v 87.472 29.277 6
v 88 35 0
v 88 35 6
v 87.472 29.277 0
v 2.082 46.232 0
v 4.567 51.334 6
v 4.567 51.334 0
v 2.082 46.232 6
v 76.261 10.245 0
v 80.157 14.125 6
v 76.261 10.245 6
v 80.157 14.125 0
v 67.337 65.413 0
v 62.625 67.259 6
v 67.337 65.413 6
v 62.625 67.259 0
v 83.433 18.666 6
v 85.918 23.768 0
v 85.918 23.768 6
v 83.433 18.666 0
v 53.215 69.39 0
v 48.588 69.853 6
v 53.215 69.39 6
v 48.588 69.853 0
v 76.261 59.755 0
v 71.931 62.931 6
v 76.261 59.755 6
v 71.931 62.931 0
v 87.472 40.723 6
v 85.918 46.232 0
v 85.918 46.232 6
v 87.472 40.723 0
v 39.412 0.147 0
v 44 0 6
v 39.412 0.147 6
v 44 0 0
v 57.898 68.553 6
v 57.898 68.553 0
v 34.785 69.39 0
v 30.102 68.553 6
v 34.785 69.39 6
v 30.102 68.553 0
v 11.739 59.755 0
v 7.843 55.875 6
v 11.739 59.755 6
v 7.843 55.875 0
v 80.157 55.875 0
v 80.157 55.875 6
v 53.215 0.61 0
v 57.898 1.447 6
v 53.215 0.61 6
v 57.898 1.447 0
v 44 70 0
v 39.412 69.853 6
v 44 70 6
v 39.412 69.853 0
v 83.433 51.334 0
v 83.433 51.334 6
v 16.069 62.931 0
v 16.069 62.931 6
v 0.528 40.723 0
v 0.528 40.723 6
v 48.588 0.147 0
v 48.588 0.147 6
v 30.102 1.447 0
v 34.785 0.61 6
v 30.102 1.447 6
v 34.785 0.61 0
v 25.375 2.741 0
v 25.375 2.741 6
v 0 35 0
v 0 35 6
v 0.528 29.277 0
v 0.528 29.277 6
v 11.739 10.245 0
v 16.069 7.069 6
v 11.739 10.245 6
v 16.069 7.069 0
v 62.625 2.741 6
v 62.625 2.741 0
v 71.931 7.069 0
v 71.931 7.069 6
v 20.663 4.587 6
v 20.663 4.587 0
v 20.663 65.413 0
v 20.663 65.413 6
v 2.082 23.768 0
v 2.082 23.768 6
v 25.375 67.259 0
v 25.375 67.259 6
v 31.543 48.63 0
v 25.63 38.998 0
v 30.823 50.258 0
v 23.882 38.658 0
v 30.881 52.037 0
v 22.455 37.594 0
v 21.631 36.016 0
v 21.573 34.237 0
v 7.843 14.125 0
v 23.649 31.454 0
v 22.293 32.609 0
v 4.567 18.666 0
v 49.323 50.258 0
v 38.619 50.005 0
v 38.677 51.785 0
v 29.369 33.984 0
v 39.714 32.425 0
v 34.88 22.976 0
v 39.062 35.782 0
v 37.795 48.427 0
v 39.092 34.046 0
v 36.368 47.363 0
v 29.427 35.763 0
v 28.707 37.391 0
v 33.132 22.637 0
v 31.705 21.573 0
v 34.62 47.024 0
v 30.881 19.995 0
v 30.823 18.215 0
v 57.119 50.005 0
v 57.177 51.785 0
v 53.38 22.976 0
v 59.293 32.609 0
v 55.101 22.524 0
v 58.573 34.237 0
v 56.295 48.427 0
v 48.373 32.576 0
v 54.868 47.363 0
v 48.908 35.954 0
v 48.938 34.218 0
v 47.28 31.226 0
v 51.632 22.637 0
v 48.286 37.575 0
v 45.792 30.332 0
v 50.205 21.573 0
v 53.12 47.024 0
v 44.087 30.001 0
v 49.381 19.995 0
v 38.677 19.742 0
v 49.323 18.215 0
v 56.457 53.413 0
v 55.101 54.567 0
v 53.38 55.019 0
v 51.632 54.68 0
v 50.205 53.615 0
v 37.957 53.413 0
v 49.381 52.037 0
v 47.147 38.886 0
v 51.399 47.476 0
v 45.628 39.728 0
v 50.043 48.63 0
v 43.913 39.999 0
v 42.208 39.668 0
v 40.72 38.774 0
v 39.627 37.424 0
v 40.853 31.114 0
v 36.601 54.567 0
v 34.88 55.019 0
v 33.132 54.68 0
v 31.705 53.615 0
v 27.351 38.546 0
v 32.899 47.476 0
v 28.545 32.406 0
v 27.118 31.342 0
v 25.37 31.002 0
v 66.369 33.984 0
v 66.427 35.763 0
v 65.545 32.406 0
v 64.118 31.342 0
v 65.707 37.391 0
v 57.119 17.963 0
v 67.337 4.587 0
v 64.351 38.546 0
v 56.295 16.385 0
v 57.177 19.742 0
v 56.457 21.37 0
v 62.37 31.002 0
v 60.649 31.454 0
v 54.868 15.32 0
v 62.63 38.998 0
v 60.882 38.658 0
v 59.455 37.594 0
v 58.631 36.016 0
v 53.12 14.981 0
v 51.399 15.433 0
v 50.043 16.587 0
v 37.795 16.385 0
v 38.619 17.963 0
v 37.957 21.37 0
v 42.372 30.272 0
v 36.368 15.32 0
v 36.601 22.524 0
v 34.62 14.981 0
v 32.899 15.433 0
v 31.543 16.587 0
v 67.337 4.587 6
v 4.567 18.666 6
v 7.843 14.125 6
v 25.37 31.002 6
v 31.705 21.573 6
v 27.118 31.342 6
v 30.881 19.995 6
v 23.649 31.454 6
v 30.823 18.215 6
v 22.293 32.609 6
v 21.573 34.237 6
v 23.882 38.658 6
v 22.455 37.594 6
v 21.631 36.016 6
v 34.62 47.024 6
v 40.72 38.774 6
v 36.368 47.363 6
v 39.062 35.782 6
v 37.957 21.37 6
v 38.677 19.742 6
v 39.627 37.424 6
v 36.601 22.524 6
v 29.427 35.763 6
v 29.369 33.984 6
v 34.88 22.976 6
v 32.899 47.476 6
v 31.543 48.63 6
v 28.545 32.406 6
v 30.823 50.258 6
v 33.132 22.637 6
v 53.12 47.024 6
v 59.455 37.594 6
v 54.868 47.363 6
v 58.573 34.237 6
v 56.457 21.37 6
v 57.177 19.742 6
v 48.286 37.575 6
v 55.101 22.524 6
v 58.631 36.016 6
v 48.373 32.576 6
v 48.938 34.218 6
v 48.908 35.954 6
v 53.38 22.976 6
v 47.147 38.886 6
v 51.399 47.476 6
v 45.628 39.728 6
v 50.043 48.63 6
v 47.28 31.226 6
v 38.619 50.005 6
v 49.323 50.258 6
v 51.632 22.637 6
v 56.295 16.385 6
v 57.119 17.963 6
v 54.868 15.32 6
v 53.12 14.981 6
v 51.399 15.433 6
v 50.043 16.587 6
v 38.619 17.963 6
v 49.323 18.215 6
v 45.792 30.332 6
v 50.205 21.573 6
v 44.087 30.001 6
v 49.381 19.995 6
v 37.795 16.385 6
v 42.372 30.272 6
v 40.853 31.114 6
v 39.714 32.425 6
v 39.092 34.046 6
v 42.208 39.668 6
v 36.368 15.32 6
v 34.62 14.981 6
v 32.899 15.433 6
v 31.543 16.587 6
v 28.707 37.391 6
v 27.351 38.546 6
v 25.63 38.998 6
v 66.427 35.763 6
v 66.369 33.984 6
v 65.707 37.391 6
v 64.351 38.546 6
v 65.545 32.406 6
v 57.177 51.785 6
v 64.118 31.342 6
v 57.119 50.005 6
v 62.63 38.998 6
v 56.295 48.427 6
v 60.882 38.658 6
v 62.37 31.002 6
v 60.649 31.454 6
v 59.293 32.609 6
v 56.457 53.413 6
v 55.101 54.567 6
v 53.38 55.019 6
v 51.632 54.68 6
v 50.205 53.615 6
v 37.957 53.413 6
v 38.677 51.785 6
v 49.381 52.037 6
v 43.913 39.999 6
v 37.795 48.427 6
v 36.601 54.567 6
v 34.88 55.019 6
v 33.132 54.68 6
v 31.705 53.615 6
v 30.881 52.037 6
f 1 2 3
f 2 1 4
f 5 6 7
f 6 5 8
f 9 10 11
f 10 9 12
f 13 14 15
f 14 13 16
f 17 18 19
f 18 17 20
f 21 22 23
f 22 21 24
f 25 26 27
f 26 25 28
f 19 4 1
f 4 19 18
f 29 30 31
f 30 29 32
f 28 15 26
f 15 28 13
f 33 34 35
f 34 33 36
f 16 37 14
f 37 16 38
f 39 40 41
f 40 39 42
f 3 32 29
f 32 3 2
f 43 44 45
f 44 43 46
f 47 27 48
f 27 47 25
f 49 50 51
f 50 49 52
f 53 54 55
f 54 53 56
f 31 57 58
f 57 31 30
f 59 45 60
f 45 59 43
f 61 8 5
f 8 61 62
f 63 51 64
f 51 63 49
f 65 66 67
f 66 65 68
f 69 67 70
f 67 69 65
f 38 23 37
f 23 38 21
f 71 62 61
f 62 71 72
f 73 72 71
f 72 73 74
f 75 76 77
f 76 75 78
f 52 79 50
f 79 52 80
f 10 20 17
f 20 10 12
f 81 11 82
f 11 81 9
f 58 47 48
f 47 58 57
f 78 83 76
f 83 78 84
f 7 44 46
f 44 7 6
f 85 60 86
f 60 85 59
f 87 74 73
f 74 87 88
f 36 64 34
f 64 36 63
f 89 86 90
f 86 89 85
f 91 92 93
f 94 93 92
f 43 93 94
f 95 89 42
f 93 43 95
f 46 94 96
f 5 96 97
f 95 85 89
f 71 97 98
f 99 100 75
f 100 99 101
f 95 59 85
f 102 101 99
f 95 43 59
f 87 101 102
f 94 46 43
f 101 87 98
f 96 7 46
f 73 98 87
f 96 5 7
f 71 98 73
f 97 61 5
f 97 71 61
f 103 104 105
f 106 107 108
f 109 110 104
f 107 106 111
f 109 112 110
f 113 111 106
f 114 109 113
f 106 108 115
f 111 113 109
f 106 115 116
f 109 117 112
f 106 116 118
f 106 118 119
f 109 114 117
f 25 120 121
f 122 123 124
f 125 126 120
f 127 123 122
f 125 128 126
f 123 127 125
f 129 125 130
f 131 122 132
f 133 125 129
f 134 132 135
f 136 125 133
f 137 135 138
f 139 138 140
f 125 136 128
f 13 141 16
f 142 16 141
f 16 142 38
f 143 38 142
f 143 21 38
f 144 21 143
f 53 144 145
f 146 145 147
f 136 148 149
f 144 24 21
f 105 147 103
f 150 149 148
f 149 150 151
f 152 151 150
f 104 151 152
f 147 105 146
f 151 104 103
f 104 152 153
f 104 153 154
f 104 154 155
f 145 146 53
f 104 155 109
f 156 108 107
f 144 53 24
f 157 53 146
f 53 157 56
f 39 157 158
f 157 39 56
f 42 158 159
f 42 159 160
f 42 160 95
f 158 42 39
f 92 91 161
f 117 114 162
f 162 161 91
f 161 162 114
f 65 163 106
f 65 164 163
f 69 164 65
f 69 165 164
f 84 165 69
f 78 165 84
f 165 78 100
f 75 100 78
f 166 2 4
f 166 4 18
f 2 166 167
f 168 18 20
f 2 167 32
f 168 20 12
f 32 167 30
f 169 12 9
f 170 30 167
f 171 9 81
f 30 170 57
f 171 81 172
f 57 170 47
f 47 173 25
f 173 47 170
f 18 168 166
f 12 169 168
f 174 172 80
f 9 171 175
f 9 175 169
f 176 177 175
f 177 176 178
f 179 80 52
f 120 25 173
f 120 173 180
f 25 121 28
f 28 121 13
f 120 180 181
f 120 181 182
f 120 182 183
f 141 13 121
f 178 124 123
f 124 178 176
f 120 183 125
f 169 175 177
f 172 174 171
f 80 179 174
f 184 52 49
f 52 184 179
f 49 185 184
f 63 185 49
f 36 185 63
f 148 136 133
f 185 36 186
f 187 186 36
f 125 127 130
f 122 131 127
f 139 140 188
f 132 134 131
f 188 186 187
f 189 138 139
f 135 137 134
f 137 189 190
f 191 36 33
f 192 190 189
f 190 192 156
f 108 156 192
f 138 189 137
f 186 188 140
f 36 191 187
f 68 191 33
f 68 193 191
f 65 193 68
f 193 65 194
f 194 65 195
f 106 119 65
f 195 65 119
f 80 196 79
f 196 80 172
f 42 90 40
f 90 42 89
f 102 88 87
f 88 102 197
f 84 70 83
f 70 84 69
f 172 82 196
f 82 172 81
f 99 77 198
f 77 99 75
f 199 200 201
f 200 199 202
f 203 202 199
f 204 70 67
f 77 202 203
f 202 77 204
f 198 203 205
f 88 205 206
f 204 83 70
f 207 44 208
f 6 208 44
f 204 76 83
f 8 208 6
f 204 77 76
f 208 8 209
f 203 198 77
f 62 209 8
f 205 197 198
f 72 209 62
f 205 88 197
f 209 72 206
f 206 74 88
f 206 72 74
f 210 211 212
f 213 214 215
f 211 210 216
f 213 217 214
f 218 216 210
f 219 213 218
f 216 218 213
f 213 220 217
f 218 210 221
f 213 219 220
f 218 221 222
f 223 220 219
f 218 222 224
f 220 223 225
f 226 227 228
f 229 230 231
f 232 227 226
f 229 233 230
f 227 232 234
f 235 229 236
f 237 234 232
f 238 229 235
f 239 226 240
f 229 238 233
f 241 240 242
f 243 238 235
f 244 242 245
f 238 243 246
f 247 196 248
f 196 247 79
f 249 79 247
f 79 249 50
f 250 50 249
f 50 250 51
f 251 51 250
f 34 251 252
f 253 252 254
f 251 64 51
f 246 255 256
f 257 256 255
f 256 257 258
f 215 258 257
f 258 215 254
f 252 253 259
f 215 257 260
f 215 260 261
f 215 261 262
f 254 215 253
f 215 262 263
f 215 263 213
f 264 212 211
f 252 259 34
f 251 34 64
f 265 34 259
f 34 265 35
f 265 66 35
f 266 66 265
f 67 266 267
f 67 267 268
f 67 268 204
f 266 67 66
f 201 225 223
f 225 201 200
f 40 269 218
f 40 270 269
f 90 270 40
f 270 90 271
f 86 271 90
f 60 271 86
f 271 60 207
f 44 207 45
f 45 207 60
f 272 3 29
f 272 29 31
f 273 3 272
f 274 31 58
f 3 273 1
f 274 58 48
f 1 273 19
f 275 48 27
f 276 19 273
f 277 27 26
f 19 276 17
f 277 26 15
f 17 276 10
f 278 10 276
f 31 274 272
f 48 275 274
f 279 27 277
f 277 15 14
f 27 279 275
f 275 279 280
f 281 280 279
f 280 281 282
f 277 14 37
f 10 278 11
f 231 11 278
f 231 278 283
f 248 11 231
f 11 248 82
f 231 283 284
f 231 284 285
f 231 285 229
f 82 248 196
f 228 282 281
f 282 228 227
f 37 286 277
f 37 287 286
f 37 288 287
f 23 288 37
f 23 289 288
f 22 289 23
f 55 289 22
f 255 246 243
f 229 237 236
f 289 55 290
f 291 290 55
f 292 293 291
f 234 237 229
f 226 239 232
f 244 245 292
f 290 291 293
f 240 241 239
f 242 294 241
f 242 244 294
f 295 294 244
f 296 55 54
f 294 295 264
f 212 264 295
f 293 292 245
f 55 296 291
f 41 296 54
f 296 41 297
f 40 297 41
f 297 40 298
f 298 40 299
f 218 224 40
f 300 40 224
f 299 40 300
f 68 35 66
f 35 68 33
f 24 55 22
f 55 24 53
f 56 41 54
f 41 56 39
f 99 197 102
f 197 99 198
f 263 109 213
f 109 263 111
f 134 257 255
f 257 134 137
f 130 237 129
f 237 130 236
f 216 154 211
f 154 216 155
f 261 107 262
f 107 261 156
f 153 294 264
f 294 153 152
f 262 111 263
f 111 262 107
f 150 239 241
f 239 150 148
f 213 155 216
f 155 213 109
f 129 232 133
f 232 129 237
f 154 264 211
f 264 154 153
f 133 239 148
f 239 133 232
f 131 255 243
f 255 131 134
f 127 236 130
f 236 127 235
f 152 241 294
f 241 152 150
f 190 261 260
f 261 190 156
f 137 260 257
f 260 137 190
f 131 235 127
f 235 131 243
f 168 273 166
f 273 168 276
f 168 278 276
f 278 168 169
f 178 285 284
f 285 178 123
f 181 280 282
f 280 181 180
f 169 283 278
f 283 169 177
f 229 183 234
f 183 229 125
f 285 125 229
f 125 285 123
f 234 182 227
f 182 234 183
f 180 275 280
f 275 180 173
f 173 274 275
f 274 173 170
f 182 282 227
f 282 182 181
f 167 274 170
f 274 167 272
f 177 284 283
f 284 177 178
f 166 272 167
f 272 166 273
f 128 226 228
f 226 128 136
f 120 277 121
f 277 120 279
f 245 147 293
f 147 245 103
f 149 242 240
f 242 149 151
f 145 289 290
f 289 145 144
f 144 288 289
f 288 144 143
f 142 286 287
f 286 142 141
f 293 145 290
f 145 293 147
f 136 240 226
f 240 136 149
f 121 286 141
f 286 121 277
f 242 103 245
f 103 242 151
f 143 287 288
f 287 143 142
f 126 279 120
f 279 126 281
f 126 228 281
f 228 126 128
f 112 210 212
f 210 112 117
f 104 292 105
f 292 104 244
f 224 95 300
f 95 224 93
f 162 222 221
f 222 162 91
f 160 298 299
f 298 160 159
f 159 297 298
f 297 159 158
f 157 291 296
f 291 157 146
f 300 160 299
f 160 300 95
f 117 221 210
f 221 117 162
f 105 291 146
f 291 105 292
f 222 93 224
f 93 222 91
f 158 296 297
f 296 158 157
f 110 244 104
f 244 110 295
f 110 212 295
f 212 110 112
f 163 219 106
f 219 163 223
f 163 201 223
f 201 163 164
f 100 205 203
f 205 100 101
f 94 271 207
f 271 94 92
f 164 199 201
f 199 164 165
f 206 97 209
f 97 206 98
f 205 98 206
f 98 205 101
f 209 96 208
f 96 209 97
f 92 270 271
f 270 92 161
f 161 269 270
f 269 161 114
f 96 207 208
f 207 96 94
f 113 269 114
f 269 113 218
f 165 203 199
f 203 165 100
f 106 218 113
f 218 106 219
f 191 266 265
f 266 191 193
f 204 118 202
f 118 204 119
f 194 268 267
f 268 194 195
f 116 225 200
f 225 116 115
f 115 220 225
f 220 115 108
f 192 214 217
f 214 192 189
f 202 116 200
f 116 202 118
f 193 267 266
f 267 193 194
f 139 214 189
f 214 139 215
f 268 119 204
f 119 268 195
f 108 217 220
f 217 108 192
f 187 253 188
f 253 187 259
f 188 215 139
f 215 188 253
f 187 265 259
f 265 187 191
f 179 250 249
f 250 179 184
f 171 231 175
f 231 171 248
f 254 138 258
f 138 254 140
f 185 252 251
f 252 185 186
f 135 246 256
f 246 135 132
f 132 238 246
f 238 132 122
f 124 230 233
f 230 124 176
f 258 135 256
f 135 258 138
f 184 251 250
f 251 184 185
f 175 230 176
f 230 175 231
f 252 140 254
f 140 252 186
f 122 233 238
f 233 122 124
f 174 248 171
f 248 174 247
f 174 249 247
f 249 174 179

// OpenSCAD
$fn = 32;

// ----------------------------------------------------------------------
// Cam plate: double_lobe cam, base R32
// ----------------------------------------------------------------------

// --- parameters (mm) ---
base_r = 32;              // base circle radius
lobe_h = 12;              // cam lobe rise
bore_r = 5;               // shaft bore radius
plate_t = 6;              // plate thickness, Z (extrusion height)
ring_r = 18.5;            // lightening ring radius
bolt_r = 4;               // lightening hole radius

profile = [[88, 35], [87.472, 40.723], [85.918, 46.232], [83.433, 51.334], [80.157, 55.875], [76.261, 59.755], [71.931, 62.931], [67.337, 65.413], [62.625, 67.259], [57.898, 68.553], [53.215, 69.39], [48.588, 69.853], [44, 70], [39.412, 69.853], [34.785, 69.39], [30.102, 68.553], [25.375, 67.259], [20.663, 65.413], [16.069, 62.931], [11.739, 59.755], [7.843, 55.875], [4.567, 51.334], [2.082, 46.232], [0.528, 40.723], [0, 35], [0.528, 29.277], [2.082, 23.768], [4.567, 18.666], [7.843, 14.125], [11.739, 10.245], [16.069, 7.069], [20.663, 4.587], [25.375, 2.741], [30.102, 1.447], [34.785, 0.61], [39.412, 0.147], [44, 0], [48.588, 0.147], [53.215, 0.61], [57.898, 1.447], [62.625, 2.741], [67.337, 4.587], [71.931, 7.069], [76.261, 10.245], [80.157, 14.125], [83.433, 18.666], [85.918, 23.768], [87.472, 29.277]];  // primary outline, 48 points, counter clockwise
void_1 = [[48.908, 35.954], [48.286, 37.575], [47.147, 38.886], [45.628, 39.728], [43.913, 39.999], [42.208, 39.668], [40.72, 38.774], [39.627, 37.424], [39.062, 35.782], [39.092, 34.046], [39.714, 32.425], [40.853, 31.114], [42.372, 30.272], [44.087, 30.001], [45.792, 30.332], [47.28, 31.226], [48.373, 32.576], [48.938, 34.218]];  // shaft bore, 18 points
void_2 = [[66.427, 35.763], [65.707, 37.391], [64.351, 38.546], [62.63, 38.998], [60.882, 38.658], [59.455, 37.594], [58.631, 36.016], [58.573, 34.237], [59.293, 32.609], [60.649, 31.454], [62.37, 31.002], [64.118, 31.342], [65.545, 32.406], [66.369, 33.984]];  // lightening hole 1, 14 points
void_3 = [[57.177, 51.785], [56.457, 53.413], [55.101, 54.567], [53.38, 55.019], [51.632, 54.68], [50.205, 53.615], [49.381, 52.037], [49.323, 50.258], [50.043, 48.63], [51.399, 47.476], [53.12, 47.024], [54.868, 47.363], [56.295, 48.427], [57.119, 50.005]];  // lightening hole 2, 14 points
void_4 = [[38.677, 51.785], [37.957, 53.413], [36.601, 54.567], [34.88, 55.019], [33.132, 54.68], [31.705, 53.615], [30.881, 52.037], [30.823, 50.258], [31.543, 48.63], [32.899, 47.476], [34.62, 47.024], [36.368, 47.363], [37.795, 48.427], [38.619, 50.005]];  // lightening hole 3, 14 points
void_5 = [[29.427, 35.763], [28.707, 37.391], [27.351, 38.546], [25.63, 38.998], [23.882, 38.658], [22.455, 37.594], [21.631, 36.016], [21.573, 34.237], [22.293, 32.609], [23.649, 31.454], [25.37, 31.002], [27.118, 31.342], [28.545, 32.406], [29.369, 33.984]];  // lightening hole 4, 14 points
void_6 = [[38.677, 19.742], [37.957, 21.37], [36.601, 22.524], [34.88, 22.976], [33.132, 22.637], [31.705, 21.573], [30.881, 19.995], [30.823, 18.215], [31.543, 16.587], [32.899, 15.433], [34.62, 14.981], [36.368, 15.32], [37.795, 16.385], [38.619, 17.963]];  // lightening hole 5, 14 points
void_7 = [[57.177, 19.742], [56.457, 21.37], [55.101, 22.524], [53.38, 22.976], [51.632, 22.637], [50.205, 21.573], [49.381, 19.995], [49.323, 18.215], [50.043, 16.587], [51.399, 15.433], [53.12, 14.981], [54.868, 15.32], [56.295, 16.385], [57.119, 17.963]];  // lightening hole 6, 14 points

// --- the one profile operation ---
difference() {
  linear_extrude(height = plate_t) polygon(points = profile);
  translate([0, 0, -1])
    linear_extrude(height = plate_t + 2) polygon(points = void_1);
  translate([0, 0, -1])
    linear_extrude(height = plate_t + 2) polygon(points = void_2);
  translate([0, 0, -1])
    linear_extrude(height = plate_t + 2) polygon(points = void_3);
  translate([0, 0, -1])
    linear_extrude(height = plate_t + 2) polygon(points = void_4);
  translate([0, 0, -1])
    linear_extrude(height = plate_t + 2) polygon(points = void_5);
  translate([0, 0, -1])
    linear_extrude(height = plate_t + 2) polygon(points = void_6);
  translate([0, 0, -1])
    linear_extrude(height = plate_t + 2) polygon(points = void_7);
}
